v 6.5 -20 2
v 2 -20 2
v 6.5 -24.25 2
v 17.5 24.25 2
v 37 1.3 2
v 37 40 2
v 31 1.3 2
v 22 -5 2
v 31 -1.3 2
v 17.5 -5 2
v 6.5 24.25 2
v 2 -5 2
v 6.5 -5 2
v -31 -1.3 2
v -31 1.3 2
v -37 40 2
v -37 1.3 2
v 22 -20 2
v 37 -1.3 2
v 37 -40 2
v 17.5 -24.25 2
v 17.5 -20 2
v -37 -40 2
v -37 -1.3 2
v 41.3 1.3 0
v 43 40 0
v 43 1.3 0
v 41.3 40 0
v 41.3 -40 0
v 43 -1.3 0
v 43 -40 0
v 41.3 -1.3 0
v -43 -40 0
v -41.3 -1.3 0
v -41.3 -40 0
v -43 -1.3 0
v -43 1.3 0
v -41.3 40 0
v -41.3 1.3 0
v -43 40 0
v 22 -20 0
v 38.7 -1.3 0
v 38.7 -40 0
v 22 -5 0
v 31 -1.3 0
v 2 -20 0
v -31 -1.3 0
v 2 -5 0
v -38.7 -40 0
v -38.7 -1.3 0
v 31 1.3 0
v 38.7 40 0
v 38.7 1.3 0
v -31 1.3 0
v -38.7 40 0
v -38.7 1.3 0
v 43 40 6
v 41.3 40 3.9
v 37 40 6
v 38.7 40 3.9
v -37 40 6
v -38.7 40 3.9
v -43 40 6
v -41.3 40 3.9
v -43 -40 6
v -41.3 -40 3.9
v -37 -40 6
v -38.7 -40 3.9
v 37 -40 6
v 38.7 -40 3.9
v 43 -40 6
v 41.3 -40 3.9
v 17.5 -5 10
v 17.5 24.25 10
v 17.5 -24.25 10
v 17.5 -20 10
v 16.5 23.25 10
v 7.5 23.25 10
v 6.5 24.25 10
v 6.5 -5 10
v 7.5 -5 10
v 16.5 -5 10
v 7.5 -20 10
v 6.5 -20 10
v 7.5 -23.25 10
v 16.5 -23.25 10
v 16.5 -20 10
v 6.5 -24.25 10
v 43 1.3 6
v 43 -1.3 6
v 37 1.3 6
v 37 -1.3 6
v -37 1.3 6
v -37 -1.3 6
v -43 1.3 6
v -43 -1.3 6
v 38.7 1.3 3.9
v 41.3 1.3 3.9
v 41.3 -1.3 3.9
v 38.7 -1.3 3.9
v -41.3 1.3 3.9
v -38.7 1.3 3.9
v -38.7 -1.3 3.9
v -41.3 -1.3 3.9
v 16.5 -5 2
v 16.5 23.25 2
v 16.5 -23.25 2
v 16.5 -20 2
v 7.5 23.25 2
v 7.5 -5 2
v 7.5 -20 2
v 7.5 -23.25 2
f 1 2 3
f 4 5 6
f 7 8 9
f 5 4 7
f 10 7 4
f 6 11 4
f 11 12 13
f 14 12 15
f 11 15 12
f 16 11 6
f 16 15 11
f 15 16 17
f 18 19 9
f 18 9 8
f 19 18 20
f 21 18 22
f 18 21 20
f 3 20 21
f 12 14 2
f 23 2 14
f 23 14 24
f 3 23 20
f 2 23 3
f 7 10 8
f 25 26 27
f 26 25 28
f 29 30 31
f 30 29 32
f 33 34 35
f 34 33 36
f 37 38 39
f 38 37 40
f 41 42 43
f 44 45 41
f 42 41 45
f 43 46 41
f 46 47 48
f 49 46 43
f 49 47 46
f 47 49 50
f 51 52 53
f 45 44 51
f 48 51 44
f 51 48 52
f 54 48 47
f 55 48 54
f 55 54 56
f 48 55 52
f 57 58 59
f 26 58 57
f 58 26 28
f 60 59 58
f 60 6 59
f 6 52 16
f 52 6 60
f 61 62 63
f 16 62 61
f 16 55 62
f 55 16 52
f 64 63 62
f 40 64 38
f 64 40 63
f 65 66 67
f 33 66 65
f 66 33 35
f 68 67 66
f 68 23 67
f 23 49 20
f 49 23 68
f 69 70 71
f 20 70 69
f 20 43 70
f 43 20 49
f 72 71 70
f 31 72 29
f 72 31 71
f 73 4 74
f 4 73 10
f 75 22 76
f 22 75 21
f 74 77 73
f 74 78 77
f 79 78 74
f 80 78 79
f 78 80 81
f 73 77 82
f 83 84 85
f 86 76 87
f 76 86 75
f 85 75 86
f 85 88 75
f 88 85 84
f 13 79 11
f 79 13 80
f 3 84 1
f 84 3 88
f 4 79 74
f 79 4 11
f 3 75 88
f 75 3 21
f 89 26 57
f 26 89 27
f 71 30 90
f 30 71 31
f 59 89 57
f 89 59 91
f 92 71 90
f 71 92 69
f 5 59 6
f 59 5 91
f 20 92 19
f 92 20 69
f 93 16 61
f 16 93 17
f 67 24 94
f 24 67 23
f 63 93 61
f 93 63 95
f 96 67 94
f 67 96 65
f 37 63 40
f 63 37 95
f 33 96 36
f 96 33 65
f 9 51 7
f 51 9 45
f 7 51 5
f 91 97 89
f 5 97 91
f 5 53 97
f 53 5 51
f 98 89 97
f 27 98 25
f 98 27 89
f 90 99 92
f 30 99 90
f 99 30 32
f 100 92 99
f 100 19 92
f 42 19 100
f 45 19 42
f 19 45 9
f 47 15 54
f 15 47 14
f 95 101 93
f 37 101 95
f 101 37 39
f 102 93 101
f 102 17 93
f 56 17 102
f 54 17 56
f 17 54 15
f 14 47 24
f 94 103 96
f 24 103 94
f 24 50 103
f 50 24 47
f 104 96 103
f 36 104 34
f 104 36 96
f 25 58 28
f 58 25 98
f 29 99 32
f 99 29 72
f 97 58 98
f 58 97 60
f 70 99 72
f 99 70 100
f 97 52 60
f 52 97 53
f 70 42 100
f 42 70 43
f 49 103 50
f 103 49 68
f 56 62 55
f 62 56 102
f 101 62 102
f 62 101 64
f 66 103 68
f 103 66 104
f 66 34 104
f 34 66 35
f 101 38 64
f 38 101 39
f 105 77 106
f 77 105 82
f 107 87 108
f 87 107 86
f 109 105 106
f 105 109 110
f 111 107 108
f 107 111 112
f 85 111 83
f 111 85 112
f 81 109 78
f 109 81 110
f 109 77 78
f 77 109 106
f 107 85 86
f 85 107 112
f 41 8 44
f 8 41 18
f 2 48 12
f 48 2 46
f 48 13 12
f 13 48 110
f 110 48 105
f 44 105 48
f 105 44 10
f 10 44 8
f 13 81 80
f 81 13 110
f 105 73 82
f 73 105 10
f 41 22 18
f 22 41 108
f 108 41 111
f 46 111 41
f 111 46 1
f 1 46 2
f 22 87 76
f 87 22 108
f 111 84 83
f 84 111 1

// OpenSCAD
$fn=30;
ts=2;


ugol=[10+0.5+1,15+0.5+1,2+0.4];//размеры уголка высота/ширина/толщина
pole=[80,80,ts];// [20,30,ts];;//размеры поля
stk=[ts,10,6*ts];//размеры стойки 
stl=[ts*3+stk.x, ts*3+stk.y, stk.z];//размеры столба

fp=[stk.x-0.2,stk.y-0.4,50];//форма прижимной пласитны 

hz=10;
hx=4.5;
dlh=10;

plt=42;
pin=[9, 5*9+1.5, 12];
botr=8;
prk=[20,15,pin.z*2];

all();
module all(){
    difference(){
        union(){
            translate([0,0,ts/2])cube(pole,true);
            translate([plt/2-pin.x,0,ts+botr/2])cube([pin.x+ts,pin.y+ts,botr],true);
            translate([pole.x/2,0,3*ts/2])cube([3*ts,pole.y, 3*ts],true);
            translate([-pole.x/2,0,3*ts/2])cube([3*ts,pole.y, 3*ts],true);
        }
        translate([pole.x/2,0,3*ts/2])cube([stl.x*2+ts,ts+0.6, 4*ts],true);
        translate([-pole.x/2,0,3*ts/2])cube([stl.x*2+ts,ts+0.6, 4*ts],true);
        translate([pole.x/2,0,ts-0.1])cube([ts+0.6,pole.y+ts, ts*2],true);
        translate([-pole.x/2,0,ts-0.1])cube([ts+0.6,pole.y+ts, ts*2],true);
        translate([plt/2-pin.x,0,ts+pin.z/2])cube(pin,true);
        translate([plt/2-pin.x,-2.5*5,0])cube(prk,true);
    }
}

//test00();
module test00(){
    rotate([0,90,0])translate([-stl.x/2,0,0]){rotate([0,0,180])difference(){
            translate([0,0,(fp.z+5*ts)/2])cube([ stl.x,ugol.y+2*ts, fp.z+5*ts],true);
            translate([0,0,(fp.z-5*ts)])ug();
        }
        translate([0,0,ts])cube([ stl.x, pole.y, ts*2],true);
    }
}



//ug();
module ug(){
    translate([0,ugol.y/2-ugol.z/2,ugol.x/2+ts*3])cube([pole.x*2,ts,ugol.x],true);
    translate([0,0,ugol.x/2+ts*3+ugol.x/2-ugol.z/2])cube([pole.x*2+4*ts,ugol.y,ts],true);
    translate([0,ugol.y/2-ugol.z/2-ts+0.1,ugol.x/2+ts*2+ugol.x/2-ugol.z/2+0.1])cube([pole.x*2+4*ts,ts,ts],true);
}
